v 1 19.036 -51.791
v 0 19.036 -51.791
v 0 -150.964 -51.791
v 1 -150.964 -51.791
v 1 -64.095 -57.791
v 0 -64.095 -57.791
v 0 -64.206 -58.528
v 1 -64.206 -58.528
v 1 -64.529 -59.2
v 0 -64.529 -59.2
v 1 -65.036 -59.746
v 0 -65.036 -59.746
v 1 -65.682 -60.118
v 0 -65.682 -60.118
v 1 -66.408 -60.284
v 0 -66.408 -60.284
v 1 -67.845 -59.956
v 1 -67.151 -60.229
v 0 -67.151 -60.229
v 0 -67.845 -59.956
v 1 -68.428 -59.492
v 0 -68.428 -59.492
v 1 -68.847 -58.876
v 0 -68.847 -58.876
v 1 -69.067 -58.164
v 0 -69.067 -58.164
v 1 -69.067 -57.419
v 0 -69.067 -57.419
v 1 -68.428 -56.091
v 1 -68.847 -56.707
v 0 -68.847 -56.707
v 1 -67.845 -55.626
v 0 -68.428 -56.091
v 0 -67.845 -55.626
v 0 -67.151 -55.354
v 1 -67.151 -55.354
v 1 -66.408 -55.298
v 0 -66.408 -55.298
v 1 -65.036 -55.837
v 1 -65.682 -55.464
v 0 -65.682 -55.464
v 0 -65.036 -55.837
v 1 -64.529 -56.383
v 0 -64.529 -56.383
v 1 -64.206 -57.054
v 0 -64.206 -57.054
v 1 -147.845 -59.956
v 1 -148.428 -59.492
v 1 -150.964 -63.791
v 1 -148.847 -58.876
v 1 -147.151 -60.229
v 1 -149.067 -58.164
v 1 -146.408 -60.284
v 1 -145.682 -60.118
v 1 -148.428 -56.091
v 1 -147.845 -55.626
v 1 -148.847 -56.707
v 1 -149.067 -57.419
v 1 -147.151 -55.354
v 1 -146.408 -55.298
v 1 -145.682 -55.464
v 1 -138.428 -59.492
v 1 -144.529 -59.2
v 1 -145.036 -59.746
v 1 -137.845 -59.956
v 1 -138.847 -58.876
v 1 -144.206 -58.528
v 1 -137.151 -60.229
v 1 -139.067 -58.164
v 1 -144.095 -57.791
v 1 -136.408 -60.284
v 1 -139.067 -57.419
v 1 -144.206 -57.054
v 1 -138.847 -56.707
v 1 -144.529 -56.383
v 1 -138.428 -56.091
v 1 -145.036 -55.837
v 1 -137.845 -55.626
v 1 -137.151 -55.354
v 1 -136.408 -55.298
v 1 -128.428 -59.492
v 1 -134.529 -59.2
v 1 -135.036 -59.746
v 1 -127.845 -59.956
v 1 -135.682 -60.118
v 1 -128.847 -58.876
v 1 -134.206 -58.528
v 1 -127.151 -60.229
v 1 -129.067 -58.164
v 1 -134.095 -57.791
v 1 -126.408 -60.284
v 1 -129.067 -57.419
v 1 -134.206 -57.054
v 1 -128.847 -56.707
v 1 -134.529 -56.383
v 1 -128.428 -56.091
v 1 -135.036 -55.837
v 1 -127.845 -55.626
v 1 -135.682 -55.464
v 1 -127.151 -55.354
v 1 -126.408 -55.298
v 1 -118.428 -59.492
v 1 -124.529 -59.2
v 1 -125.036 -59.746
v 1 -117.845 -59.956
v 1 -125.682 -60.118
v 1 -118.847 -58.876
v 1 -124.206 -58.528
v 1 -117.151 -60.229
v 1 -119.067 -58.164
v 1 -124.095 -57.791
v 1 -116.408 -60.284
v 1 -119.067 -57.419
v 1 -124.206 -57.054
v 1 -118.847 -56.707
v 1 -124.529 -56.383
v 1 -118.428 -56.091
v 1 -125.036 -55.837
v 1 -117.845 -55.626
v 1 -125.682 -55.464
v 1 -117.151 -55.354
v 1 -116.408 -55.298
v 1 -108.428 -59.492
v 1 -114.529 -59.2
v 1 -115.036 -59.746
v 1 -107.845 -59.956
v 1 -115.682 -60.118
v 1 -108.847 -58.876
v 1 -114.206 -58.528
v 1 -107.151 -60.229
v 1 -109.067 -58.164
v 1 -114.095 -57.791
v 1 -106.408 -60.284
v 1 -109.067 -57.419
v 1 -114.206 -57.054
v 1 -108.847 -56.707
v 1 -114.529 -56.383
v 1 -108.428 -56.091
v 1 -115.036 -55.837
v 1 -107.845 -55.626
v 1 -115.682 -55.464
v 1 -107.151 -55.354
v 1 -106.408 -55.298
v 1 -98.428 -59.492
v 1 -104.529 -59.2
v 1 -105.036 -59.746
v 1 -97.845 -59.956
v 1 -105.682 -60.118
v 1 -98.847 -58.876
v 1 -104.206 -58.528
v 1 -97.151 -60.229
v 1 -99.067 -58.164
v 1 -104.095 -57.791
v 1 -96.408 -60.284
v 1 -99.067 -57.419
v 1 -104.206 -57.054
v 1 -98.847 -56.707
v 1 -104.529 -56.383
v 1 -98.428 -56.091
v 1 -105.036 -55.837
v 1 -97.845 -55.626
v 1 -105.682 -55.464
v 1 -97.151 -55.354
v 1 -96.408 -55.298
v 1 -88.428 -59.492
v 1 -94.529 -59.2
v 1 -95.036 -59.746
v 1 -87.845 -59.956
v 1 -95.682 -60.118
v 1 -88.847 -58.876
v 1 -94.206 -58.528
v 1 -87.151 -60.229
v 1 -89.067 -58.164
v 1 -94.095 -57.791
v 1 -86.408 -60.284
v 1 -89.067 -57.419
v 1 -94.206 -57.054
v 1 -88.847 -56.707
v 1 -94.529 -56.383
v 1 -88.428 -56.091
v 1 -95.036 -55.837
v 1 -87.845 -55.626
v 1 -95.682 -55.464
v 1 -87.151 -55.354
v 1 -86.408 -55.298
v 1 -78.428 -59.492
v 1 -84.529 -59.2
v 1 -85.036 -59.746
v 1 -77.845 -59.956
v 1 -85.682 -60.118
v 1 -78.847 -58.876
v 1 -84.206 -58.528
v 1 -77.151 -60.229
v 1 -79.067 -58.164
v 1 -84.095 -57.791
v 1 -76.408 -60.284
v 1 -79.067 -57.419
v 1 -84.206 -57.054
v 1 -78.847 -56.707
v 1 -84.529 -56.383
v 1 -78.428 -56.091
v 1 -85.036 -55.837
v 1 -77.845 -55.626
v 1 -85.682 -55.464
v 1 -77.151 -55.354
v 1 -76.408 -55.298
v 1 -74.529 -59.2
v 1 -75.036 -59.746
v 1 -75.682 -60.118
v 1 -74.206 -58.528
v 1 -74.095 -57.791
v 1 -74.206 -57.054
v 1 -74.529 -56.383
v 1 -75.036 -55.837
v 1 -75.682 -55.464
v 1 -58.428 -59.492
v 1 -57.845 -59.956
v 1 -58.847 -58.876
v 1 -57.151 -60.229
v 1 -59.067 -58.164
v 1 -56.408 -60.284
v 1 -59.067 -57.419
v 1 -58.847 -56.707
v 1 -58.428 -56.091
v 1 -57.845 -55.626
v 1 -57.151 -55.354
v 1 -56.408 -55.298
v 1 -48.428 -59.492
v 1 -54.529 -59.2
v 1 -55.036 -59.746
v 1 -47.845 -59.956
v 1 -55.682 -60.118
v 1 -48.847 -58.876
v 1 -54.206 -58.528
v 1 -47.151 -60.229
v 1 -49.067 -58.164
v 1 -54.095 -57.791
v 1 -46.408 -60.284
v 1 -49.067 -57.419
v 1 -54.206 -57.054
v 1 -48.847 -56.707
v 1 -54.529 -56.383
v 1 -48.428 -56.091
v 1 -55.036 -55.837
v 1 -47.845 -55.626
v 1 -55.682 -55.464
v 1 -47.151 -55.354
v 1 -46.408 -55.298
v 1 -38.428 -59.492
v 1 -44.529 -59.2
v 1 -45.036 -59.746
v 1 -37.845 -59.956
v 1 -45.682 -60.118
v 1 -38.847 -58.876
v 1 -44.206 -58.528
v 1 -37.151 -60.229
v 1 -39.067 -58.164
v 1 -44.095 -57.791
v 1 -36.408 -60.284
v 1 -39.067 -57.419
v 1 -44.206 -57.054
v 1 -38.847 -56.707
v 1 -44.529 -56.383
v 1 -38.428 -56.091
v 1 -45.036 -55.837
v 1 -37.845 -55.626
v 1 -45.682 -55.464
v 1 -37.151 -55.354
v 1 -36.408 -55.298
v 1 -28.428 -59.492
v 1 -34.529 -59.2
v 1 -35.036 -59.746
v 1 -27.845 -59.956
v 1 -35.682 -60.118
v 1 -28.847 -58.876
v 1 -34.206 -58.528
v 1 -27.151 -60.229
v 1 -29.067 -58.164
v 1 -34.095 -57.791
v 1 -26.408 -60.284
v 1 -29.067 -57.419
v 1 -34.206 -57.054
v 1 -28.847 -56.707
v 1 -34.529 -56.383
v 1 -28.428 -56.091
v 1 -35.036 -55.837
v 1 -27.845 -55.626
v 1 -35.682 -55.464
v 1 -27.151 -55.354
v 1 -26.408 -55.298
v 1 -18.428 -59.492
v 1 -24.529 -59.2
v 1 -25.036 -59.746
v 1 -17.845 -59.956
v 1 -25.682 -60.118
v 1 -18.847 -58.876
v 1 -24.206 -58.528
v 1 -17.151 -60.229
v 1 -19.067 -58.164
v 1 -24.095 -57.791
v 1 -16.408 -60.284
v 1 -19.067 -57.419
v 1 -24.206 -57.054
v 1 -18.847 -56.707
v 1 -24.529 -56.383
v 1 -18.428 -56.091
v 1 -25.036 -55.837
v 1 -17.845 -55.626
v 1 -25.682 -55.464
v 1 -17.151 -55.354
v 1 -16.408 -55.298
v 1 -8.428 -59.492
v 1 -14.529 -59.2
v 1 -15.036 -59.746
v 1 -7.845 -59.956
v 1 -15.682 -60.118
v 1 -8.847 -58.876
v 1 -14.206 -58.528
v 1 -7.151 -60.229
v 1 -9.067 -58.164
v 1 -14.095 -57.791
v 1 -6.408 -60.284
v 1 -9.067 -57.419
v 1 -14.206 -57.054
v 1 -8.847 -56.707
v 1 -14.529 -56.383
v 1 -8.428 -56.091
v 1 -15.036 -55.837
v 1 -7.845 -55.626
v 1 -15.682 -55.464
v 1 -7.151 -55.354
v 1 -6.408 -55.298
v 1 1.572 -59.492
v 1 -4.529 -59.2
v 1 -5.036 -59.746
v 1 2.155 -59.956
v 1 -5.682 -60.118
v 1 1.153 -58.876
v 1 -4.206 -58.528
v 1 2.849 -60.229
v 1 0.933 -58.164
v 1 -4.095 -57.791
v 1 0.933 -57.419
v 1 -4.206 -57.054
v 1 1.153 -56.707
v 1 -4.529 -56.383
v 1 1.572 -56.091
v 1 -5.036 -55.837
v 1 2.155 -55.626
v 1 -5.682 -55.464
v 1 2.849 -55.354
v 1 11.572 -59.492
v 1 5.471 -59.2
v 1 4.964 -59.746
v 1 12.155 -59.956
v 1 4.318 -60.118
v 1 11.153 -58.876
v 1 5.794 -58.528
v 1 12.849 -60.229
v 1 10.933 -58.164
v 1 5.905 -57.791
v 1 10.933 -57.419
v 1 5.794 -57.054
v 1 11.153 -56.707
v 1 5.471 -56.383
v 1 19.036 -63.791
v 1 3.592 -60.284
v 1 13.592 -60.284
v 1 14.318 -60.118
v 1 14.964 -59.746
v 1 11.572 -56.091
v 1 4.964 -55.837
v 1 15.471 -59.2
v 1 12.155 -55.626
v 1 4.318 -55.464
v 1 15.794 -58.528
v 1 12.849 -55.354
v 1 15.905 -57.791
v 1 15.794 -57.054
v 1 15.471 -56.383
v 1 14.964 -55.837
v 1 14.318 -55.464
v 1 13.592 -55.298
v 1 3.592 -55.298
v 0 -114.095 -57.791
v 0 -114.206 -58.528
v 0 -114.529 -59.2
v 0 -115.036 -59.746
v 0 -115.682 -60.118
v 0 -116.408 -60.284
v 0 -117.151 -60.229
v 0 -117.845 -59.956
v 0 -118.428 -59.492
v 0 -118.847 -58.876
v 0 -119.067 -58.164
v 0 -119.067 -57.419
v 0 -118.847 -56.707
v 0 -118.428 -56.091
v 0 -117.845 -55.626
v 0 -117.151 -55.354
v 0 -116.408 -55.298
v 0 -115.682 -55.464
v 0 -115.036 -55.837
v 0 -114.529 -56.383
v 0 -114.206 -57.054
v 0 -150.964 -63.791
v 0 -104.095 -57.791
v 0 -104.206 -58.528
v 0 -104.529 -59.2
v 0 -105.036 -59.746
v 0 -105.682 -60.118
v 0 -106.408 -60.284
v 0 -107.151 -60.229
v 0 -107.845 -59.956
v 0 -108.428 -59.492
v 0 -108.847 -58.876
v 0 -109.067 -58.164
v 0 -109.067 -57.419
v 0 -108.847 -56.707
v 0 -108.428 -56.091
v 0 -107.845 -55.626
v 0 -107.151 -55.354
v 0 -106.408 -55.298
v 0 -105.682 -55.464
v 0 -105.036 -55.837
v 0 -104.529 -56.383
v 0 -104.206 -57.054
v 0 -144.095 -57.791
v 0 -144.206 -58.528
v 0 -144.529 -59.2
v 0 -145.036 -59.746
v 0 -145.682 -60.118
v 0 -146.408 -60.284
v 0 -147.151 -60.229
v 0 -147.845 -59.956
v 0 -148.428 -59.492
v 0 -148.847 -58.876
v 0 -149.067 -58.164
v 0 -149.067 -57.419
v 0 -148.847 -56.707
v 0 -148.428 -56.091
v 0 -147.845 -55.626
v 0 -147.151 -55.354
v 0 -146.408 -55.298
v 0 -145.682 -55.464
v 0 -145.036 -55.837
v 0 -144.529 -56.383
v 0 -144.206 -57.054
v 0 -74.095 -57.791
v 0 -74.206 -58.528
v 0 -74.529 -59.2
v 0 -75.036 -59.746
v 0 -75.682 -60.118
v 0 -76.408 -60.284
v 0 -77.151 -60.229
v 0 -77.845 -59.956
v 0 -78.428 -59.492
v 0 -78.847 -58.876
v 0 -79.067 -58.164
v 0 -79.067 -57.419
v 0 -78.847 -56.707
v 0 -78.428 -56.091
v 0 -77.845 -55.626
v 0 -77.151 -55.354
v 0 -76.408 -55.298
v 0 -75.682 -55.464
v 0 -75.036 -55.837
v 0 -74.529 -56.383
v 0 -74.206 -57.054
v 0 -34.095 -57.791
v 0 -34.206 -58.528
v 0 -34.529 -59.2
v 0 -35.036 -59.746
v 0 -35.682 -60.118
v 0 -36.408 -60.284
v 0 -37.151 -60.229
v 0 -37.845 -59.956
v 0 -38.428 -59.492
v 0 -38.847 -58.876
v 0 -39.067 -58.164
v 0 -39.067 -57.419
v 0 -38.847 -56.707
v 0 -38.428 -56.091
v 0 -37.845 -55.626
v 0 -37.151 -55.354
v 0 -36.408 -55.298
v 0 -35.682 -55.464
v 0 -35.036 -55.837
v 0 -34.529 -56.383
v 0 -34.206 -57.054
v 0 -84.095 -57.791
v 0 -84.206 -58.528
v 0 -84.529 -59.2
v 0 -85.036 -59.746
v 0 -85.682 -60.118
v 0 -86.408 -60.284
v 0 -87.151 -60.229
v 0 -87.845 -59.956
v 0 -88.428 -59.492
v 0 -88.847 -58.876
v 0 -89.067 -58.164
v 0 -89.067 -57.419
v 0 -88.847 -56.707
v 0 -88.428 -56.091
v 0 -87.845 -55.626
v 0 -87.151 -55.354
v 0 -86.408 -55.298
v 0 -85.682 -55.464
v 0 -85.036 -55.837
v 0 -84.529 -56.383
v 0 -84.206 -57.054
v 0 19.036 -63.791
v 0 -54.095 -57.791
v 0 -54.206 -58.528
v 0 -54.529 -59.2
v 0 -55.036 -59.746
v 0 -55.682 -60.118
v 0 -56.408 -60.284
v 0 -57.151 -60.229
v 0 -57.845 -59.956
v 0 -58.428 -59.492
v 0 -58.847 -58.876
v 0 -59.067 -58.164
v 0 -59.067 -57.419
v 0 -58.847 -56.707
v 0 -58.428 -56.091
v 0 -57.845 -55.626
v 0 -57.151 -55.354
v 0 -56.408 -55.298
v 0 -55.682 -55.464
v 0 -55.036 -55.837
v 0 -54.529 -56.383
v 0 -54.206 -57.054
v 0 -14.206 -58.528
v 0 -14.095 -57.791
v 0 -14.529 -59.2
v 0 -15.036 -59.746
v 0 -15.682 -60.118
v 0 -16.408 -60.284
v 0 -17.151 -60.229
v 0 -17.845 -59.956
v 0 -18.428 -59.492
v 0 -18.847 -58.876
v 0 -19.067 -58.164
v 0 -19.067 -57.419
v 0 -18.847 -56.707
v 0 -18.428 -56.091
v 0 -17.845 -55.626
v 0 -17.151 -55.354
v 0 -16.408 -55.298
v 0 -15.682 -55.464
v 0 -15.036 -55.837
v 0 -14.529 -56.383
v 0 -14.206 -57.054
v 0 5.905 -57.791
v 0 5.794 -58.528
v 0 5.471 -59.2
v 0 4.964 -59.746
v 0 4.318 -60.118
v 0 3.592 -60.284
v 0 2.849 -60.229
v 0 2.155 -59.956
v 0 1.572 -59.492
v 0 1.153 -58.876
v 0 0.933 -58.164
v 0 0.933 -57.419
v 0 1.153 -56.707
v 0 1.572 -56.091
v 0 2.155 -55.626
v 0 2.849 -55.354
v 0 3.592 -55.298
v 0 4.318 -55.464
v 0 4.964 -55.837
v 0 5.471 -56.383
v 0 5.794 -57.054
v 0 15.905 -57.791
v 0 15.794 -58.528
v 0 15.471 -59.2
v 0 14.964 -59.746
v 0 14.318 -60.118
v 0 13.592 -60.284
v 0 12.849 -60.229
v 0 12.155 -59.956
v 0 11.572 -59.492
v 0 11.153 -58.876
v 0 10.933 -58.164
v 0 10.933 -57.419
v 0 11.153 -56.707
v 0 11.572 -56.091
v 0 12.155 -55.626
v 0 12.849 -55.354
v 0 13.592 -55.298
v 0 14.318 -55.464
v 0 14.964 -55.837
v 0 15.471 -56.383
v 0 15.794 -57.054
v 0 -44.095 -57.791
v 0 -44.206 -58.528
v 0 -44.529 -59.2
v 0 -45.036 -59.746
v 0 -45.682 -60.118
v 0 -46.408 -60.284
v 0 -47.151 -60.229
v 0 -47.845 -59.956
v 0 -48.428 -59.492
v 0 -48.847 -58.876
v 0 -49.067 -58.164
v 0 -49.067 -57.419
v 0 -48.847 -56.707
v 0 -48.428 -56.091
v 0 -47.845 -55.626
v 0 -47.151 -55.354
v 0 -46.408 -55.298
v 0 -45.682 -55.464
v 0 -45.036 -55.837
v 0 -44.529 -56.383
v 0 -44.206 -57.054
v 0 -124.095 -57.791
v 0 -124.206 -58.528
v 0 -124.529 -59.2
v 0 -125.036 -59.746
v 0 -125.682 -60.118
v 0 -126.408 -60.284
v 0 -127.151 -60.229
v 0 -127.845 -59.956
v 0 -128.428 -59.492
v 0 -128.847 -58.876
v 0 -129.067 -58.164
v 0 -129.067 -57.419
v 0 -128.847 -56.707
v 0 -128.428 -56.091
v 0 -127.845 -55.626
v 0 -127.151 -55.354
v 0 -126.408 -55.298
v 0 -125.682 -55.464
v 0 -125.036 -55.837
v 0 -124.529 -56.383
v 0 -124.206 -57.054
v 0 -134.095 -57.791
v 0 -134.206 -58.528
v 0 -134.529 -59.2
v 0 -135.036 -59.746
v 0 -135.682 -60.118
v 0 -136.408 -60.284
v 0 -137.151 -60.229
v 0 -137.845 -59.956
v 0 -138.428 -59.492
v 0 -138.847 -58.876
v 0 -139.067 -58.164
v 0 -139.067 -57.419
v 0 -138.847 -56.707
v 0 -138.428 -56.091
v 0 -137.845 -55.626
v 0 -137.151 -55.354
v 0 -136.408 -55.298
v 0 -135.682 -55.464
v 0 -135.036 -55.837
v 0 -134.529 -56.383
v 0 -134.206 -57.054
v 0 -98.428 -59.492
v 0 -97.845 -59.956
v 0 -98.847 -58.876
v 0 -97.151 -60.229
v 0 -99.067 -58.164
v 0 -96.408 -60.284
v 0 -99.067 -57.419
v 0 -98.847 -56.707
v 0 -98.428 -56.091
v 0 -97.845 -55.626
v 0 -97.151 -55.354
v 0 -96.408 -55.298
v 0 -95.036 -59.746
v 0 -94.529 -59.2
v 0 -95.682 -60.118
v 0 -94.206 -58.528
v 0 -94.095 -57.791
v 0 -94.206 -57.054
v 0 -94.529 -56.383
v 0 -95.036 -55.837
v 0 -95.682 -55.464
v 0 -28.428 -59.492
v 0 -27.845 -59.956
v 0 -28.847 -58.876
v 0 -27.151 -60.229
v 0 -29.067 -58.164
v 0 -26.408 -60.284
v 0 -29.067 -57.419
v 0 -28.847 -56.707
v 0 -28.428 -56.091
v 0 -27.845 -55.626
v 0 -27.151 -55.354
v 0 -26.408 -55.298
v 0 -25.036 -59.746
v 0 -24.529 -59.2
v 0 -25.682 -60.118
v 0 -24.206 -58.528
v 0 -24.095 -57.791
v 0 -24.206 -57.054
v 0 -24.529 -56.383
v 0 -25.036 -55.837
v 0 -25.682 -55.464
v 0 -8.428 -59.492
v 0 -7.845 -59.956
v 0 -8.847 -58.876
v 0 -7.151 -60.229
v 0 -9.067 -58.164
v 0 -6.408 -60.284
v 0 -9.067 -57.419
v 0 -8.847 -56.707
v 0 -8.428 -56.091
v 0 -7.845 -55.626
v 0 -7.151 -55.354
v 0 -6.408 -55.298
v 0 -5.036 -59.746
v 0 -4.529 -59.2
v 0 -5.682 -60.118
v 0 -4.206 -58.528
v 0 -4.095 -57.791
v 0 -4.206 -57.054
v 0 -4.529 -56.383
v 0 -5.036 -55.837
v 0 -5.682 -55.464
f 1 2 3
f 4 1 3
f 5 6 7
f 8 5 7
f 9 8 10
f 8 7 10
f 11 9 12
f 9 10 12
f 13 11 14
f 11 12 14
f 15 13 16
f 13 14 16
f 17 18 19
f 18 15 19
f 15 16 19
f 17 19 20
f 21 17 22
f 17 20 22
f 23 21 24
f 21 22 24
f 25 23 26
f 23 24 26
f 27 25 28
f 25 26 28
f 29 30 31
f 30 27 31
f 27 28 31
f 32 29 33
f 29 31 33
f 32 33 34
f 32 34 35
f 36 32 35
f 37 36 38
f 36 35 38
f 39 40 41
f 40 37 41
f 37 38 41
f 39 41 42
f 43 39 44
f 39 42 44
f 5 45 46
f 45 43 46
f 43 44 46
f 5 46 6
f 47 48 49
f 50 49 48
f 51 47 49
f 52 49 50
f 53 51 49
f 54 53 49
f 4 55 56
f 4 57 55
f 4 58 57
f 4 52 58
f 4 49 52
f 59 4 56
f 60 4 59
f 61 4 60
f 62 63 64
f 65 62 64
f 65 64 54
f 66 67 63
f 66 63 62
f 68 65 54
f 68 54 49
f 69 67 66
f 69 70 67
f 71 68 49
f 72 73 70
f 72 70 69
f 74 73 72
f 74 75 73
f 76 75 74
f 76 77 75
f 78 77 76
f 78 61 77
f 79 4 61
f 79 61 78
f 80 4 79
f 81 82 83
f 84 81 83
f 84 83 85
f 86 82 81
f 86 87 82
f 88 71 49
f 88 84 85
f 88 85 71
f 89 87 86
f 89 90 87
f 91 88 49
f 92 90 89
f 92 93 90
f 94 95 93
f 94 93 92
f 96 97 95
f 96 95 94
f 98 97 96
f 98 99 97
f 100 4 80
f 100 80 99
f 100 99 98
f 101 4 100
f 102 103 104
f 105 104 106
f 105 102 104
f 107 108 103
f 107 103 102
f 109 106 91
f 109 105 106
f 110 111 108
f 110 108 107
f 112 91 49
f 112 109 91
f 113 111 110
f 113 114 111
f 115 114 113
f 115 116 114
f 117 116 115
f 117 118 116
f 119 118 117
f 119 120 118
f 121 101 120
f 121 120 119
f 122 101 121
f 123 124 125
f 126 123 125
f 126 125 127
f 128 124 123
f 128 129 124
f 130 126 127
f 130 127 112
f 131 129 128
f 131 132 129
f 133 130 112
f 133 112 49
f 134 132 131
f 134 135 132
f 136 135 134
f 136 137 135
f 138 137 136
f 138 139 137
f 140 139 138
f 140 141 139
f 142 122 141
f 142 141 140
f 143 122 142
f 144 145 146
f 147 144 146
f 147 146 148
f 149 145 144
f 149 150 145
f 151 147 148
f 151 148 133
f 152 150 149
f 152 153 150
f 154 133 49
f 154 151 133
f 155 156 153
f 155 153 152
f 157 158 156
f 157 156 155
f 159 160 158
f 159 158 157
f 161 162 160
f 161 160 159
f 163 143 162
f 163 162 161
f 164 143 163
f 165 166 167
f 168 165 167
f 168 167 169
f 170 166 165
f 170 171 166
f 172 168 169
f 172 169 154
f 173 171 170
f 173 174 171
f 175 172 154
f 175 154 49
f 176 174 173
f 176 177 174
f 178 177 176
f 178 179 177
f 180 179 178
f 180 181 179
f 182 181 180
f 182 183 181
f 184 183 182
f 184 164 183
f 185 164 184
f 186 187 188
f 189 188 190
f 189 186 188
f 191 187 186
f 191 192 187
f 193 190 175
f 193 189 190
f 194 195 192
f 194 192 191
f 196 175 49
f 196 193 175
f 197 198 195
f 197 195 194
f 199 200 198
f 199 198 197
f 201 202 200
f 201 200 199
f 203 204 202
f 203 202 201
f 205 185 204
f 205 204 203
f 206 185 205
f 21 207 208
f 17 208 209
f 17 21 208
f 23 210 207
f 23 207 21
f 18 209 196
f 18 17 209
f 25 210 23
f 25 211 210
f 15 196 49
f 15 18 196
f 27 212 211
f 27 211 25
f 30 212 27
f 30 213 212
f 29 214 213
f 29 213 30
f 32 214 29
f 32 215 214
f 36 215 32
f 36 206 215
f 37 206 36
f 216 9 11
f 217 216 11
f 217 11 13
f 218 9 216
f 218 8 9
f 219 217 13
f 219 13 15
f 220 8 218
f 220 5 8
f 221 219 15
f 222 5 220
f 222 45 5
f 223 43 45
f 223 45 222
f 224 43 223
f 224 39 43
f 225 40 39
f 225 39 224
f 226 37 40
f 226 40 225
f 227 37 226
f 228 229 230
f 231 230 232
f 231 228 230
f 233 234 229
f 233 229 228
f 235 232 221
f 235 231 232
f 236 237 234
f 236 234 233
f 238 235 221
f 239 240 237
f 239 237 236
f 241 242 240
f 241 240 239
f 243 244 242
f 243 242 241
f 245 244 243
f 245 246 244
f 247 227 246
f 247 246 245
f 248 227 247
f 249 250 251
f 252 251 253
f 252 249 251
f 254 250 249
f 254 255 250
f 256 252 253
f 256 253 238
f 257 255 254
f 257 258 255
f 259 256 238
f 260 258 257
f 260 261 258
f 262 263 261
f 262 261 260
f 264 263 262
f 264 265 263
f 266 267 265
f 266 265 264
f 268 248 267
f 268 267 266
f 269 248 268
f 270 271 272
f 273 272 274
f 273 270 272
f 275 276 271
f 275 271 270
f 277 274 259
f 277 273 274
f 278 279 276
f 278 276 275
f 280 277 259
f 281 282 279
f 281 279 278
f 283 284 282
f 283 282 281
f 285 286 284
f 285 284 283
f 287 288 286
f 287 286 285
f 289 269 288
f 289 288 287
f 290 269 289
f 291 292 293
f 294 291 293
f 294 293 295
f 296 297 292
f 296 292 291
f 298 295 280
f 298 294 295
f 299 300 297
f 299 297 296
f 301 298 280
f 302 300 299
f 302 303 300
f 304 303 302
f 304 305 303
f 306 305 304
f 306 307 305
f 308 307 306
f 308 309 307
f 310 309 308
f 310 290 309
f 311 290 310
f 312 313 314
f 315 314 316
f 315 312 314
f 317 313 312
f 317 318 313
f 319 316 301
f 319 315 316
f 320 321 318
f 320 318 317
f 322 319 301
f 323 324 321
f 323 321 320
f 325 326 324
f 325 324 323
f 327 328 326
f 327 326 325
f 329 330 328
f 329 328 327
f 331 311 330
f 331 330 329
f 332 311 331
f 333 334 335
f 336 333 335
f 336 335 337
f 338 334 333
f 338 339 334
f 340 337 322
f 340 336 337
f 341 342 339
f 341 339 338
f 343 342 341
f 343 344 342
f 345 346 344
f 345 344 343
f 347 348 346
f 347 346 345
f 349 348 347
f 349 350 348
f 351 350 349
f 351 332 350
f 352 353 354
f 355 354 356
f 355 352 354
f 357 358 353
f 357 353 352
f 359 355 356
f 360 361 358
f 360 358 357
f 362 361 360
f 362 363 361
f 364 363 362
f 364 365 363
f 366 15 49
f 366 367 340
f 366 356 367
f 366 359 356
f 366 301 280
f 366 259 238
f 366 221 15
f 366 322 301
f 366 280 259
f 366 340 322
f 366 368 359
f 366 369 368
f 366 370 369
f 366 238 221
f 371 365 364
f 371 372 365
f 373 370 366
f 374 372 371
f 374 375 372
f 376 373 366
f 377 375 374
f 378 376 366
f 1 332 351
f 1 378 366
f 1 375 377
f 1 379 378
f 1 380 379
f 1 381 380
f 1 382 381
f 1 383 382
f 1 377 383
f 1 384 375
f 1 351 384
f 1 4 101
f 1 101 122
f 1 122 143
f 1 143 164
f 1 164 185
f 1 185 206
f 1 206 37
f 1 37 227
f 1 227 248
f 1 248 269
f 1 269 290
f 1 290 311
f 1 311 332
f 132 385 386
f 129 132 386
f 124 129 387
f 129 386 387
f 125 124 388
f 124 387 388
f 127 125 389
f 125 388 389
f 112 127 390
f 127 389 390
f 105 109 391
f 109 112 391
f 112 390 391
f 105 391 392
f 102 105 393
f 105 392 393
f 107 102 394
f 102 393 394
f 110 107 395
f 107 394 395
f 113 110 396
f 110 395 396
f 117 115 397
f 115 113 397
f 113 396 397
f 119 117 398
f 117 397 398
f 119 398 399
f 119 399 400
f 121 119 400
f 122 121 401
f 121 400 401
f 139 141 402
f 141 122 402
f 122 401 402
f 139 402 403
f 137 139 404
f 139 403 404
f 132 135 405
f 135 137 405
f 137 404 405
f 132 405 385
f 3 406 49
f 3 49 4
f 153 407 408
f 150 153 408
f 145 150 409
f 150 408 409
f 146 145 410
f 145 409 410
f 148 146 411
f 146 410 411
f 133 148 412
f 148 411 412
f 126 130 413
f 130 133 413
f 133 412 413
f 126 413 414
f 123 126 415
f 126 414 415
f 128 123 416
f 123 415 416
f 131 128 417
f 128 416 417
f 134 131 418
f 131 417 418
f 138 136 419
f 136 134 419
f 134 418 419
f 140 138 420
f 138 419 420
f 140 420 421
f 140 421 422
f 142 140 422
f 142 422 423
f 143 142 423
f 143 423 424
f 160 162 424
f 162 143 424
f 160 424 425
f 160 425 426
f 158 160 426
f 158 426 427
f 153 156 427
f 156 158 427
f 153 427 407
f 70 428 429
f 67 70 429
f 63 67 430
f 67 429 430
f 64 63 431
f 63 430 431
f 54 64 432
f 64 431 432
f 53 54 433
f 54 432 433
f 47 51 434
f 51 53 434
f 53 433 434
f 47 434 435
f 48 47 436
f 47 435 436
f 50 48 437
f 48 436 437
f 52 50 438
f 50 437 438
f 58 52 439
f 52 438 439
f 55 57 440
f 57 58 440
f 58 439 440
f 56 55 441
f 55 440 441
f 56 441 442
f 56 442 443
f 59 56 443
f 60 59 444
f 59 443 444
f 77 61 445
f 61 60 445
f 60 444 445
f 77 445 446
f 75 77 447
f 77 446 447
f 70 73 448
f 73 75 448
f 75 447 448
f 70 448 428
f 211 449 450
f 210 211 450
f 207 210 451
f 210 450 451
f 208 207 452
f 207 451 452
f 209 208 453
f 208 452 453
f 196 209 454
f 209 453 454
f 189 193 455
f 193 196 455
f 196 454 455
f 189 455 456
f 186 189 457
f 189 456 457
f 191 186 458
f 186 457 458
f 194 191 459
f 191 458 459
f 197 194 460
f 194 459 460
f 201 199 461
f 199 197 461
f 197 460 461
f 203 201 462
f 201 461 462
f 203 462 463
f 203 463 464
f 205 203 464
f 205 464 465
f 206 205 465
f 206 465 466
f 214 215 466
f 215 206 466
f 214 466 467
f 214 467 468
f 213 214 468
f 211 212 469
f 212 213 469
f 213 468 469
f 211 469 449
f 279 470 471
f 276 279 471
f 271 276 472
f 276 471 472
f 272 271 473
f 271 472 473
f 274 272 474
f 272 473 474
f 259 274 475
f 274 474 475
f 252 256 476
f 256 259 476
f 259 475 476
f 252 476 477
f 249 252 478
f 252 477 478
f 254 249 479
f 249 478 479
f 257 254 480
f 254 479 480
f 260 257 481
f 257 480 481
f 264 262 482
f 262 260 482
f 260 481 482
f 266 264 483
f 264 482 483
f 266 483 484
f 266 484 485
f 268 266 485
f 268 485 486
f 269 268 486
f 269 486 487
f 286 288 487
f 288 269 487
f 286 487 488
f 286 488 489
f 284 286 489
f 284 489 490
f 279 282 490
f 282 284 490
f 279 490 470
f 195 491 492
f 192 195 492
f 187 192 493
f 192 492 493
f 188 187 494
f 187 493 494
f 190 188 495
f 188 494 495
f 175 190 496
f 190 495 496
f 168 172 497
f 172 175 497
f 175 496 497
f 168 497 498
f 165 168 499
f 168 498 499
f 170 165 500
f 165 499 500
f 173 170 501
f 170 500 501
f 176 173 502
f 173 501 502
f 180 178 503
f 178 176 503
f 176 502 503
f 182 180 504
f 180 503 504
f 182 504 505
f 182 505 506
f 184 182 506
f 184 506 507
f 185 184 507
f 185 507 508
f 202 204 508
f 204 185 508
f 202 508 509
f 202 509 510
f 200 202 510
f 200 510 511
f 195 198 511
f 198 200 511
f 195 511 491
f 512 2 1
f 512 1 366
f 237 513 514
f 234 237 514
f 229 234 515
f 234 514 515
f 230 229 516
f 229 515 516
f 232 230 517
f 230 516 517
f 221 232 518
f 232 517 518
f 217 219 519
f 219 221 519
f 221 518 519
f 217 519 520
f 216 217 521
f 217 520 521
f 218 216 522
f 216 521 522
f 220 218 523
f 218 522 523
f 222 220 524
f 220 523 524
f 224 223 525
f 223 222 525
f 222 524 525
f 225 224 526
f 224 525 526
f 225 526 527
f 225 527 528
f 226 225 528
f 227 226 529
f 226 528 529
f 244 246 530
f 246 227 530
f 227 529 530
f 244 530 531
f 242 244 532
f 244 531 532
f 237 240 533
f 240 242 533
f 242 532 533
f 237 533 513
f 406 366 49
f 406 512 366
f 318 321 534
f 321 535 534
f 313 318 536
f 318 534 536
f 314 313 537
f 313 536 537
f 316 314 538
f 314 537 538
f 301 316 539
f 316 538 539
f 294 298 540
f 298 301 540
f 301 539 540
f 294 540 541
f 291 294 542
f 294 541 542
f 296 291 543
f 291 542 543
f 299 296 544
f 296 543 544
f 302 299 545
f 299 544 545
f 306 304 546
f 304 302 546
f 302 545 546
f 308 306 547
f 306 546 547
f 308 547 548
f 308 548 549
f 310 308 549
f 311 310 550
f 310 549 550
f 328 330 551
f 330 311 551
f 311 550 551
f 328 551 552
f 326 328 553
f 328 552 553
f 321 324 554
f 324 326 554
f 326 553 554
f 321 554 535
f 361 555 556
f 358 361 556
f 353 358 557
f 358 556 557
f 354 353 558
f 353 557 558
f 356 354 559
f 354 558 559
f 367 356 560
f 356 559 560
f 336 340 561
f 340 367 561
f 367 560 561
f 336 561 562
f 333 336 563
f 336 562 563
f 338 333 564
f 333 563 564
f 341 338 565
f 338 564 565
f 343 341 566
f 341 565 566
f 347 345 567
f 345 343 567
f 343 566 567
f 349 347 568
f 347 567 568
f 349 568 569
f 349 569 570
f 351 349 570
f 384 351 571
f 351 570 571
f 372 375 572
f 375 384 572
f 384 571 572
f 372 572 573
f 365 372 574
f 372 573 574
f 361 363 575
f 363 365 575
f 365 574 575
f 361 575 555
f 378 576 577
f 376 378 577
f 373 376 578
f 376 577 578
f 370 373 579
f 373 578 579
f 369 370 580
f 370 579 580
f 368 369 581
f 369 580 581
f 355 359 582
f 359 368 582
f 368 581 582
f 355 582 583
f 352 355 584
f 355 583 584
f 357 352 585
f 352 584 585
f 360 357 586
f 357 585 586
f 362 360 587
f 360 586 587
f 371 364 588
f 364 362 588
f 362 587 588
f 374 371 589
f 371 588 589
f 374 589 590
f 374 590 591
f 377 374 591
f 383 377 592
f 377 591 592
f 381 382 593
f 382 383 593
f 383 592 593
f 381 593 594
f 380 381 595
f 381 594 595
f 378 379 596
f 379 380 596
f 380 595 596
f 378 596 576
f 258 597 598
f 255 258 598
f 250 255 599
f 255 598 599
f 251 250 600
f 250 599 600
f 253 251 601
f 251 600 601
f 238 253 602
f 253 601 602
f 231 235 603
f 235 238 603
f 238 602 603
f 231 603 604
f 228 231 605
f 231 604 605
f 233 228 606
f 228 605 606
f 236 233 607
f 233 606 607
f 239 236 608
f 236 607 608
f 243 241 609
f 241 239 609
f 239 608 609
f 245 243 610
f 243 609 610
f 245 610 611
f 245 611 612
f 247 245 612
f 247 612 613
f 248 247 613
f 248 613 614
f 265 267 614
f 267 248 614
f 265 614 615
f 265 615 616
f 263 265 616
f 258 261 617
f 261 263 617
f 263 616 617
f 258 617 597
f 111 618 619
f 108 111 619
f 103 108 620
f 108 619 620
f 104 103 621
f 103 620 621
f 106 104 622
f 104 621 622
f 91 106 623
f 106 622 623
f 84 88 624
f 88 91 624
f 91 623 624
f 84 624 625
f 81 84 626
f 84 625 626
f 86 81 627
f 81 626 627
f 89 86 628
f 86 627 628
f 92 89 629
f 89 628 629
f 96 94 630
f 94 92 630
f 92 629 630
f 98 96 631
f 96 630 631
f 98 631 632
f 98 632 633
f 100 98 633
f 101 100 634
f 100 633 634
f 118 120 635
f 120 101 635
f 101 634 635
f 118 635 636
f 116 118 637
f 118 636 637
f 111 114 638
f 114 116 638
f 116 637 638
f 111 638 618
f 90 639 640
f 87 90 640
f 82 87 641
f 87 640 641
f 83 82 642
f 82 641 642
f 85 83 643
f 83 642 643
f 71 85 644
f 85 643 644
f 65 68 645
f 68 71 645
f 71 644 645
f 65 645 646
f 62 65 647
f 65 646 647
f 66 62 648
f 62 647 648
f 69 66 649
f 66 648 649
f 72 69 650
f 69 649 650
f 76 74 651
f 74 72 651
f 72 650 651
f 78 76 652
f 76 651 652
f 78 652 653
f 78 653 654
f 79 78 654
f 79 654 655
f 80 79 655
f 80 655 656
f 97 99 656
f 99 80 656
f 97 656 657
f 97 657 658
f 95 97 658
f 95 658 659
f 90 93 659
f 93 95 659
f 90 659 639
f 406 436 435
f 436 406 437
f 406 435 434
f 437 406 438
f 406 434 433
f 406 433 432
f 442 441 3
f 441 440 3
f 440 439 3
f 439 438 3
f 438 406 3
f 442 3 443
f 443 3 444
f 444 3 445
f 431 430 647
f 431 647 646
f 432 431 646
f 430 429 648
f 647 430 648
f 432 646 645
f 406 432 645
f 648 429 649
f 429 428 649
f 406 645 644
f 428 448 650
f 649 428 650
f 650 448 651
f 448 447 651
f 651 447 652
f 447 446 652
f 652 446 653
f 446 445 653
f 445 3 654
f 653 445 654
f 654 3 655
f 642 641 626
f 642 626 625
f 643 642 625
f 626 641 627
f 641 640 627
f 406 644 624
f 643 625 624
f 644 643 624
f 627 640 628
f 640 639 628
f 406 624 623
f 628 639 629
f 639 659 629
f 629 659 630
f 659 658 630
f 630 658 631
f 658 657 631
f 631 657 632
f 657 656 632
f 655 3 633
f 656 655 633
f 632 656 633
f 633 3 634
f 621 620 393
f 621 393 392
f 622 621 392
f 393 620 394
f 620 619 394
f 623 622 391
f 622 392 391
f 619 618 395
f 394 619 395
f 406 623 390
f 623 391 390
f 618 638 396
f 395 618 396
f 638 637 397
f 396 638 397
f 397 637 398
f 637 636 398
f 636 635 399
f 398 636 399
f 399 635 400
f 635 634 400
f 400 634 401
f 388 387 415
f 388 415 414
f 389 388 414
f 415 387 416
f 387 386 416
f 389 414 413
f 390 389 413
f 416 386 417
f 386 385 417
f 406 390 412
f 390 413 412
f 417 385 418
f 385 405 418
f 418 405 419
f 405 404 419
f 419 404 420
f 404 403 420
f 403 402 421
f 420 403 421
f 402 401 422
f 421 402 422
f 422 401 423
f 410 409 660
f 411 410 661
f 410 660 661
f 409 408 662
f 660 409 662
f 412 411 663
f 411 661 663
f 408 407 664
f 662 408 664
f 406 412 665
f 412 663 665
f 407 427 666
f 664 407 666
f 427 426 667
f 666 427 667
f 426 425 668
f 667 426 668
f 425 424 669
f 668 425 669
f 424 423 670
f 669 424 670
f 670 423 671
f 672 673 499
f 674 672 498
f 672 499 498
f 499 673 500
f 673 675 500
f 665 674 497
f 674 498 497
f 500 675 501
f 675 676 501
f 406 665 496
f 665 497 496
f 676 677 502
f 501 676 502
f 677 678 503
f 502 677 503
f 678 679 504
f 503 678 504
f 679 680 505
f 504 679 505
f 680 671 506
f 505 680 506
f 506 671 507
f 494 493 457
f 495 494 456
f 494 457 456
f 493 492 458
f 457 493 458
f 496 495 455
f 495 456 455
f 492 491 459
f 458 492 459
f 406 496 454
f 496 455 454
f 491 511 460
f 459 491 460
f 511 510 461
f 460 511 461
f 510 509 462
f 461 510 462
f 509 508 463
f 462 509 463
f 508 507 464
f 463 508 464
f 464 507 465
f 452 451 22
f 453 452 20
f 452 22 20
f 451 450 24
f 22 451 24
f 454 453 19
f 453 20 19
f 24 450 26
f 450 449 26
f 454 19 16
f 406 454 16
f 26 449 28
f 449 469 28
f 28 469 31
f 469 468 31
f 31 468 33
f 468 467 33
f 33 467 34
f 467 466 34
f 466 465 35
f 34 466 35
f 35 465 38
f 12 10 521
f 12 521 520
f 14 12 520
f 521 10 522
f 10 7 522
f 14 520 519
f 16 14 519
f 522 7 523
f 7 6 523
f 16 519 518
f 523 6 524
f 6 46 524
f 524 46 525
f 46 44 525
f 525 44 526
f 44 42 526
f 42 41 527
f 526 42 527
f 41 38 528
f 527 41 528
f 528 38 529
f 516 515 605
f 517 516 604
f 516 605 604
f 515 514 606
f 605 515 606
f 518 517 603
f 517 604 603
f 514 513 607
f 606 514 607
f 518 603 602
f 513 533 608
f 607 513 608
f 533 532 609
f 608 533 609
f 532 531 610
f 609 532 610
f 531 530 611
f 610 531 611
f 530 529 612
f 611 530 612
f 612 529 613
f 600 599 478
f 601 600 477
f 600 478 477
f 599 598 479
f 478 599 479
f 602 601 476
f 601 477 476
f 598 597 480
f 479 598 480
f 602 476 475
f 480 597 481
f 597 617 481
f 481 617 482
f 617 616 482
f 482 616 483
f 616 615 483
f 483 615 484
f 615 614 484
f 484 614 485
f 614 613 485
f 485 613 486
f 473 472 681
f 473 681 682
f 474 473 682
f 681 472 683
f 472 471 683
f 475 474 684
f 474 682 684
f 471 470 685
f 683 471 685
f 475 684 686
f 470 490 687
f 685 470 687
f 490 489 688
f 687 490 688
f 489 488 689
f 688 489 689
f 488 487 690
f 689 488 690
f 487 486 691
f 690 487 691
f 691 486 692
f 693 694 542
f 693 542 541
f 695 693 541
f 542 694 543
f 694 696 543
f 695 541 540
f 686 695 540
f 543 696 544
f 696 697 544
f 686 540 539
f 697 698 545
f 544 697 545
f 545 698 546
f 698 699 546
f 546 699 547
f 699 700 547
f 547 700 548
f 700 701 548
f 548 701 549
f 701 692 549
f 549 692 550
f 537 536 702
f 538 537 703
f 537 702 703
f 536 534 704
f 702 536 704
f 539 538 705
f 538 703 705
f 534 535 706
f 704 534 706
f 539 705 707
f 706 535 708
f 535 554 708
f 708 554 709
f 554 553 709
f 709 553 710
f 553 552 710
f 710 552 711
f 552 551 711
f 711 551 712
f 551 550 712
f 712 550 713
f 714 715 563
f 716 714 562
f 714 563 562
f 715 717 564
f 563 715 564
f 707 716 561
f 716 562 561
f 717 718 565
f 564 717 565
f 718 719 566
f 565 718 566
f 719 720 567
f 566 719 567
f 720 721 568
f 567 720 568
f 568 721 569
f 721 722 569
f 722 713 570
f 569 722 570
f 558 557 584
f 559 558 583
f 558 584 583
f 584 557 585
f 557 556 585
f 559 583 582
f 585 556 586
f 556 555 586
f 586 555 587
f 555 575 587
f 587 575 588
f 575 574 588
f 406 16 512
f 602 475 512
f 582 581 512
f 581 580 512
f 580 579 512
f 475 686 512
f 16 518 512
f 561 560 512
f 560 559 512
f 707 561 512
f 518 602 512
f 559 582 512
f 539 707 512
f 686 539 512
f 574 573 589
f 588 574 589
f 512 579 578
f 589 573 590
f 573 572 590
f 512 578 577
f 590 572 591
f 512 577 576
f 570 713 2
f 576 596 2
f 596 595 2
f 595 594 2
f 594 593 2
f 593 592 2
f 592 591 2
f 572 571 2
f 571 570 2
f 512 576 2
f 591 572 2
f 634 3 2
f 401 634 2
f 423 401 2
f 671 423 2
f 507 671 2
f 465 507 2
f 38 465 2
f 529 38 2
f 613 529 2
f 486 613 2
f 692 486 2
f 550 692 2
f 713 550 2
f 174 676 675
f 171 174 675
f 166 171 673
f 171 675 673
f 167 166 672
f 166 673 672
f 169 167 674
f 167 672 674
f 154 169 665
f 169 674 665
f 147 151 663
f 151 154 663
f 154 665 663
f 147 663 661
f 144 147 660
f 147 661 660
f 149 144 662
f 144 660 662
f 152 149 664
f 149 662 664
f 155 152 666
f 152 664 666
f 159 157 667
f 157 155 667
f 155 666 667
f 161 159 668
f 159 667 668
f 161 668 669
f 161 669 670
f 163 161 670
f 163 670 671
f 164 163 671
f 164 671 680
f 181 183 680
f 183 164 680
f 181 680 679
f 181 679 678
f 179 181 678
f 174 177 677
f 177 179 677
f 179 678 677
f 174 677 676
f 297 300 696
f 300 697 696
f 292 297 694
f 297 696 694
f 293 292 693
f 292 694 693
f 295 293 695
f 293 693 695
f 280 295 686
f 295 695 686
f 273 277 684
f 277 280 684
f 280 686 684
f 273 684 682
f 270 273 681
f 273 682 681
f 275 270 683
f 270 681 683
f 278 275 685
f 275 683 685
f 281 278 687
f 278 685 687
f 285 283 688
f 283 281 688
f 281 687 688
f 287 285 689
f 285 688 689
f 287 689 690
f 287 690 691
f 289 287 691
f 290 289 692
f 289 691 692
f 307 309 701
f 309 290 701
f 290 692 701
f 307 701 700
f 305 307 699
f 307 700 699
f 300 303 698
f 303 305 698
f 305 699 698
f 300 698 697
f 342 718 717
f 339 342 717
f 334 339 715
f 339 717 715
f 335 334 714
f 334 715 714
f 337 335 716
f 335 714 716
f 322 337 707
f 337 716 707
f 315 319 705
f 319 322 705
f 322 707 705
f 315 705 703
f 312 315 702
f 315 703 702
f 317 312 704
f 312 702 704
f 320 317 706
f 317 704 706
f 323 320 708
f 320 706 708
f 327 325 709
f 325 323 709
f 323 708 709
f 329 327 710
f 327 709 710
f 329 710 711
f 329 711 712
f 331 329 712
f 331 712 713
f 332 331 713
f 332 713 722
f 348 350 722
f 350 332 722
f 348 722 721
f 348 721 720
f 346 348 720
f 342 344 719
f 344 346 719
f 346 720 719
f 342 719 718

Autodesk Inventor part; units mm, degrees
ref_plane "YZ Plane" through (0, 0, 0) normal (1, 0, 0) x (0, 1, 0)
ref_plane "XZ Plane" through (0, 0, 0) normal (0, 1, 0) x (-1, 0, 0)
ref_plane "XY Plane" through (0, 0, 0) normal (0, 0, 1) x (1, 0, 0)
sketch "Esboço1" plane through (0, 0, 0) normal (1, 0, 0) x (0, 1, 0)
  line L0 (19.0364, -63.7913) -> (-150.9636, -63.7913)
  line L1 (-150.9636, -63.7913) -> (-150.9636, -51.7913)
  line L2 (19.0364, -51.7913) -> (19.0364, -63.7913)
  circle A0 centre (-146.5949, -57.7913) radius 2.5
  line L3 (19.0364, -51.7913) -> (-150.9636, -51.7913)
  circle A1 centre (-136.5949, -57.7913) radius 2.5
  circle A2 centre (-126.5949, -57.7913) radius 2.5
  circle A3 centre (-116.5949, -57.7913) radius 2.5
  circle A4 centre (-106.5949, -57.7913) radius 2.5
  circle A5 centre (-96.5949, -57.7913) radius 2.5
  circle A6 centre (-86.5949, -57.7913) radius 2.5
  circle A7 centre (-76.5949, -57.7913) radius 2.5
  circle A8 centre (-66.5949, -57.7913) radius 2.5
  circle A9 centre (-56.5949, -57.7913) radius 2.5
  circle A10 centre (-46.5949, -57.7913) radius 2.5
  circle A11 centre (-36.5949, -57.7913) radius 2.5
  circle A12 centre (-26.5949, -57.7913) radius 2.5
  circle A13 centre (-16.5949, -57.7913) radius 2.5
  circle A14 centre (-6.5949, -57.7913) radius 2.5
  circle A15 centre (3.4051, -57.7913) radius 2.5
  circle A16 centre (13.4051, -57.7913) radius 2.5
  point P0 (0, 0)
  dimension "d2" = 12
  dimension "d3" = 170
  dimension "d4" = 5
  dimension "d10" = 10
extrude "Extrusão1" add sketch "Esboço1" along normal blind 1
properties part number "aste2"
